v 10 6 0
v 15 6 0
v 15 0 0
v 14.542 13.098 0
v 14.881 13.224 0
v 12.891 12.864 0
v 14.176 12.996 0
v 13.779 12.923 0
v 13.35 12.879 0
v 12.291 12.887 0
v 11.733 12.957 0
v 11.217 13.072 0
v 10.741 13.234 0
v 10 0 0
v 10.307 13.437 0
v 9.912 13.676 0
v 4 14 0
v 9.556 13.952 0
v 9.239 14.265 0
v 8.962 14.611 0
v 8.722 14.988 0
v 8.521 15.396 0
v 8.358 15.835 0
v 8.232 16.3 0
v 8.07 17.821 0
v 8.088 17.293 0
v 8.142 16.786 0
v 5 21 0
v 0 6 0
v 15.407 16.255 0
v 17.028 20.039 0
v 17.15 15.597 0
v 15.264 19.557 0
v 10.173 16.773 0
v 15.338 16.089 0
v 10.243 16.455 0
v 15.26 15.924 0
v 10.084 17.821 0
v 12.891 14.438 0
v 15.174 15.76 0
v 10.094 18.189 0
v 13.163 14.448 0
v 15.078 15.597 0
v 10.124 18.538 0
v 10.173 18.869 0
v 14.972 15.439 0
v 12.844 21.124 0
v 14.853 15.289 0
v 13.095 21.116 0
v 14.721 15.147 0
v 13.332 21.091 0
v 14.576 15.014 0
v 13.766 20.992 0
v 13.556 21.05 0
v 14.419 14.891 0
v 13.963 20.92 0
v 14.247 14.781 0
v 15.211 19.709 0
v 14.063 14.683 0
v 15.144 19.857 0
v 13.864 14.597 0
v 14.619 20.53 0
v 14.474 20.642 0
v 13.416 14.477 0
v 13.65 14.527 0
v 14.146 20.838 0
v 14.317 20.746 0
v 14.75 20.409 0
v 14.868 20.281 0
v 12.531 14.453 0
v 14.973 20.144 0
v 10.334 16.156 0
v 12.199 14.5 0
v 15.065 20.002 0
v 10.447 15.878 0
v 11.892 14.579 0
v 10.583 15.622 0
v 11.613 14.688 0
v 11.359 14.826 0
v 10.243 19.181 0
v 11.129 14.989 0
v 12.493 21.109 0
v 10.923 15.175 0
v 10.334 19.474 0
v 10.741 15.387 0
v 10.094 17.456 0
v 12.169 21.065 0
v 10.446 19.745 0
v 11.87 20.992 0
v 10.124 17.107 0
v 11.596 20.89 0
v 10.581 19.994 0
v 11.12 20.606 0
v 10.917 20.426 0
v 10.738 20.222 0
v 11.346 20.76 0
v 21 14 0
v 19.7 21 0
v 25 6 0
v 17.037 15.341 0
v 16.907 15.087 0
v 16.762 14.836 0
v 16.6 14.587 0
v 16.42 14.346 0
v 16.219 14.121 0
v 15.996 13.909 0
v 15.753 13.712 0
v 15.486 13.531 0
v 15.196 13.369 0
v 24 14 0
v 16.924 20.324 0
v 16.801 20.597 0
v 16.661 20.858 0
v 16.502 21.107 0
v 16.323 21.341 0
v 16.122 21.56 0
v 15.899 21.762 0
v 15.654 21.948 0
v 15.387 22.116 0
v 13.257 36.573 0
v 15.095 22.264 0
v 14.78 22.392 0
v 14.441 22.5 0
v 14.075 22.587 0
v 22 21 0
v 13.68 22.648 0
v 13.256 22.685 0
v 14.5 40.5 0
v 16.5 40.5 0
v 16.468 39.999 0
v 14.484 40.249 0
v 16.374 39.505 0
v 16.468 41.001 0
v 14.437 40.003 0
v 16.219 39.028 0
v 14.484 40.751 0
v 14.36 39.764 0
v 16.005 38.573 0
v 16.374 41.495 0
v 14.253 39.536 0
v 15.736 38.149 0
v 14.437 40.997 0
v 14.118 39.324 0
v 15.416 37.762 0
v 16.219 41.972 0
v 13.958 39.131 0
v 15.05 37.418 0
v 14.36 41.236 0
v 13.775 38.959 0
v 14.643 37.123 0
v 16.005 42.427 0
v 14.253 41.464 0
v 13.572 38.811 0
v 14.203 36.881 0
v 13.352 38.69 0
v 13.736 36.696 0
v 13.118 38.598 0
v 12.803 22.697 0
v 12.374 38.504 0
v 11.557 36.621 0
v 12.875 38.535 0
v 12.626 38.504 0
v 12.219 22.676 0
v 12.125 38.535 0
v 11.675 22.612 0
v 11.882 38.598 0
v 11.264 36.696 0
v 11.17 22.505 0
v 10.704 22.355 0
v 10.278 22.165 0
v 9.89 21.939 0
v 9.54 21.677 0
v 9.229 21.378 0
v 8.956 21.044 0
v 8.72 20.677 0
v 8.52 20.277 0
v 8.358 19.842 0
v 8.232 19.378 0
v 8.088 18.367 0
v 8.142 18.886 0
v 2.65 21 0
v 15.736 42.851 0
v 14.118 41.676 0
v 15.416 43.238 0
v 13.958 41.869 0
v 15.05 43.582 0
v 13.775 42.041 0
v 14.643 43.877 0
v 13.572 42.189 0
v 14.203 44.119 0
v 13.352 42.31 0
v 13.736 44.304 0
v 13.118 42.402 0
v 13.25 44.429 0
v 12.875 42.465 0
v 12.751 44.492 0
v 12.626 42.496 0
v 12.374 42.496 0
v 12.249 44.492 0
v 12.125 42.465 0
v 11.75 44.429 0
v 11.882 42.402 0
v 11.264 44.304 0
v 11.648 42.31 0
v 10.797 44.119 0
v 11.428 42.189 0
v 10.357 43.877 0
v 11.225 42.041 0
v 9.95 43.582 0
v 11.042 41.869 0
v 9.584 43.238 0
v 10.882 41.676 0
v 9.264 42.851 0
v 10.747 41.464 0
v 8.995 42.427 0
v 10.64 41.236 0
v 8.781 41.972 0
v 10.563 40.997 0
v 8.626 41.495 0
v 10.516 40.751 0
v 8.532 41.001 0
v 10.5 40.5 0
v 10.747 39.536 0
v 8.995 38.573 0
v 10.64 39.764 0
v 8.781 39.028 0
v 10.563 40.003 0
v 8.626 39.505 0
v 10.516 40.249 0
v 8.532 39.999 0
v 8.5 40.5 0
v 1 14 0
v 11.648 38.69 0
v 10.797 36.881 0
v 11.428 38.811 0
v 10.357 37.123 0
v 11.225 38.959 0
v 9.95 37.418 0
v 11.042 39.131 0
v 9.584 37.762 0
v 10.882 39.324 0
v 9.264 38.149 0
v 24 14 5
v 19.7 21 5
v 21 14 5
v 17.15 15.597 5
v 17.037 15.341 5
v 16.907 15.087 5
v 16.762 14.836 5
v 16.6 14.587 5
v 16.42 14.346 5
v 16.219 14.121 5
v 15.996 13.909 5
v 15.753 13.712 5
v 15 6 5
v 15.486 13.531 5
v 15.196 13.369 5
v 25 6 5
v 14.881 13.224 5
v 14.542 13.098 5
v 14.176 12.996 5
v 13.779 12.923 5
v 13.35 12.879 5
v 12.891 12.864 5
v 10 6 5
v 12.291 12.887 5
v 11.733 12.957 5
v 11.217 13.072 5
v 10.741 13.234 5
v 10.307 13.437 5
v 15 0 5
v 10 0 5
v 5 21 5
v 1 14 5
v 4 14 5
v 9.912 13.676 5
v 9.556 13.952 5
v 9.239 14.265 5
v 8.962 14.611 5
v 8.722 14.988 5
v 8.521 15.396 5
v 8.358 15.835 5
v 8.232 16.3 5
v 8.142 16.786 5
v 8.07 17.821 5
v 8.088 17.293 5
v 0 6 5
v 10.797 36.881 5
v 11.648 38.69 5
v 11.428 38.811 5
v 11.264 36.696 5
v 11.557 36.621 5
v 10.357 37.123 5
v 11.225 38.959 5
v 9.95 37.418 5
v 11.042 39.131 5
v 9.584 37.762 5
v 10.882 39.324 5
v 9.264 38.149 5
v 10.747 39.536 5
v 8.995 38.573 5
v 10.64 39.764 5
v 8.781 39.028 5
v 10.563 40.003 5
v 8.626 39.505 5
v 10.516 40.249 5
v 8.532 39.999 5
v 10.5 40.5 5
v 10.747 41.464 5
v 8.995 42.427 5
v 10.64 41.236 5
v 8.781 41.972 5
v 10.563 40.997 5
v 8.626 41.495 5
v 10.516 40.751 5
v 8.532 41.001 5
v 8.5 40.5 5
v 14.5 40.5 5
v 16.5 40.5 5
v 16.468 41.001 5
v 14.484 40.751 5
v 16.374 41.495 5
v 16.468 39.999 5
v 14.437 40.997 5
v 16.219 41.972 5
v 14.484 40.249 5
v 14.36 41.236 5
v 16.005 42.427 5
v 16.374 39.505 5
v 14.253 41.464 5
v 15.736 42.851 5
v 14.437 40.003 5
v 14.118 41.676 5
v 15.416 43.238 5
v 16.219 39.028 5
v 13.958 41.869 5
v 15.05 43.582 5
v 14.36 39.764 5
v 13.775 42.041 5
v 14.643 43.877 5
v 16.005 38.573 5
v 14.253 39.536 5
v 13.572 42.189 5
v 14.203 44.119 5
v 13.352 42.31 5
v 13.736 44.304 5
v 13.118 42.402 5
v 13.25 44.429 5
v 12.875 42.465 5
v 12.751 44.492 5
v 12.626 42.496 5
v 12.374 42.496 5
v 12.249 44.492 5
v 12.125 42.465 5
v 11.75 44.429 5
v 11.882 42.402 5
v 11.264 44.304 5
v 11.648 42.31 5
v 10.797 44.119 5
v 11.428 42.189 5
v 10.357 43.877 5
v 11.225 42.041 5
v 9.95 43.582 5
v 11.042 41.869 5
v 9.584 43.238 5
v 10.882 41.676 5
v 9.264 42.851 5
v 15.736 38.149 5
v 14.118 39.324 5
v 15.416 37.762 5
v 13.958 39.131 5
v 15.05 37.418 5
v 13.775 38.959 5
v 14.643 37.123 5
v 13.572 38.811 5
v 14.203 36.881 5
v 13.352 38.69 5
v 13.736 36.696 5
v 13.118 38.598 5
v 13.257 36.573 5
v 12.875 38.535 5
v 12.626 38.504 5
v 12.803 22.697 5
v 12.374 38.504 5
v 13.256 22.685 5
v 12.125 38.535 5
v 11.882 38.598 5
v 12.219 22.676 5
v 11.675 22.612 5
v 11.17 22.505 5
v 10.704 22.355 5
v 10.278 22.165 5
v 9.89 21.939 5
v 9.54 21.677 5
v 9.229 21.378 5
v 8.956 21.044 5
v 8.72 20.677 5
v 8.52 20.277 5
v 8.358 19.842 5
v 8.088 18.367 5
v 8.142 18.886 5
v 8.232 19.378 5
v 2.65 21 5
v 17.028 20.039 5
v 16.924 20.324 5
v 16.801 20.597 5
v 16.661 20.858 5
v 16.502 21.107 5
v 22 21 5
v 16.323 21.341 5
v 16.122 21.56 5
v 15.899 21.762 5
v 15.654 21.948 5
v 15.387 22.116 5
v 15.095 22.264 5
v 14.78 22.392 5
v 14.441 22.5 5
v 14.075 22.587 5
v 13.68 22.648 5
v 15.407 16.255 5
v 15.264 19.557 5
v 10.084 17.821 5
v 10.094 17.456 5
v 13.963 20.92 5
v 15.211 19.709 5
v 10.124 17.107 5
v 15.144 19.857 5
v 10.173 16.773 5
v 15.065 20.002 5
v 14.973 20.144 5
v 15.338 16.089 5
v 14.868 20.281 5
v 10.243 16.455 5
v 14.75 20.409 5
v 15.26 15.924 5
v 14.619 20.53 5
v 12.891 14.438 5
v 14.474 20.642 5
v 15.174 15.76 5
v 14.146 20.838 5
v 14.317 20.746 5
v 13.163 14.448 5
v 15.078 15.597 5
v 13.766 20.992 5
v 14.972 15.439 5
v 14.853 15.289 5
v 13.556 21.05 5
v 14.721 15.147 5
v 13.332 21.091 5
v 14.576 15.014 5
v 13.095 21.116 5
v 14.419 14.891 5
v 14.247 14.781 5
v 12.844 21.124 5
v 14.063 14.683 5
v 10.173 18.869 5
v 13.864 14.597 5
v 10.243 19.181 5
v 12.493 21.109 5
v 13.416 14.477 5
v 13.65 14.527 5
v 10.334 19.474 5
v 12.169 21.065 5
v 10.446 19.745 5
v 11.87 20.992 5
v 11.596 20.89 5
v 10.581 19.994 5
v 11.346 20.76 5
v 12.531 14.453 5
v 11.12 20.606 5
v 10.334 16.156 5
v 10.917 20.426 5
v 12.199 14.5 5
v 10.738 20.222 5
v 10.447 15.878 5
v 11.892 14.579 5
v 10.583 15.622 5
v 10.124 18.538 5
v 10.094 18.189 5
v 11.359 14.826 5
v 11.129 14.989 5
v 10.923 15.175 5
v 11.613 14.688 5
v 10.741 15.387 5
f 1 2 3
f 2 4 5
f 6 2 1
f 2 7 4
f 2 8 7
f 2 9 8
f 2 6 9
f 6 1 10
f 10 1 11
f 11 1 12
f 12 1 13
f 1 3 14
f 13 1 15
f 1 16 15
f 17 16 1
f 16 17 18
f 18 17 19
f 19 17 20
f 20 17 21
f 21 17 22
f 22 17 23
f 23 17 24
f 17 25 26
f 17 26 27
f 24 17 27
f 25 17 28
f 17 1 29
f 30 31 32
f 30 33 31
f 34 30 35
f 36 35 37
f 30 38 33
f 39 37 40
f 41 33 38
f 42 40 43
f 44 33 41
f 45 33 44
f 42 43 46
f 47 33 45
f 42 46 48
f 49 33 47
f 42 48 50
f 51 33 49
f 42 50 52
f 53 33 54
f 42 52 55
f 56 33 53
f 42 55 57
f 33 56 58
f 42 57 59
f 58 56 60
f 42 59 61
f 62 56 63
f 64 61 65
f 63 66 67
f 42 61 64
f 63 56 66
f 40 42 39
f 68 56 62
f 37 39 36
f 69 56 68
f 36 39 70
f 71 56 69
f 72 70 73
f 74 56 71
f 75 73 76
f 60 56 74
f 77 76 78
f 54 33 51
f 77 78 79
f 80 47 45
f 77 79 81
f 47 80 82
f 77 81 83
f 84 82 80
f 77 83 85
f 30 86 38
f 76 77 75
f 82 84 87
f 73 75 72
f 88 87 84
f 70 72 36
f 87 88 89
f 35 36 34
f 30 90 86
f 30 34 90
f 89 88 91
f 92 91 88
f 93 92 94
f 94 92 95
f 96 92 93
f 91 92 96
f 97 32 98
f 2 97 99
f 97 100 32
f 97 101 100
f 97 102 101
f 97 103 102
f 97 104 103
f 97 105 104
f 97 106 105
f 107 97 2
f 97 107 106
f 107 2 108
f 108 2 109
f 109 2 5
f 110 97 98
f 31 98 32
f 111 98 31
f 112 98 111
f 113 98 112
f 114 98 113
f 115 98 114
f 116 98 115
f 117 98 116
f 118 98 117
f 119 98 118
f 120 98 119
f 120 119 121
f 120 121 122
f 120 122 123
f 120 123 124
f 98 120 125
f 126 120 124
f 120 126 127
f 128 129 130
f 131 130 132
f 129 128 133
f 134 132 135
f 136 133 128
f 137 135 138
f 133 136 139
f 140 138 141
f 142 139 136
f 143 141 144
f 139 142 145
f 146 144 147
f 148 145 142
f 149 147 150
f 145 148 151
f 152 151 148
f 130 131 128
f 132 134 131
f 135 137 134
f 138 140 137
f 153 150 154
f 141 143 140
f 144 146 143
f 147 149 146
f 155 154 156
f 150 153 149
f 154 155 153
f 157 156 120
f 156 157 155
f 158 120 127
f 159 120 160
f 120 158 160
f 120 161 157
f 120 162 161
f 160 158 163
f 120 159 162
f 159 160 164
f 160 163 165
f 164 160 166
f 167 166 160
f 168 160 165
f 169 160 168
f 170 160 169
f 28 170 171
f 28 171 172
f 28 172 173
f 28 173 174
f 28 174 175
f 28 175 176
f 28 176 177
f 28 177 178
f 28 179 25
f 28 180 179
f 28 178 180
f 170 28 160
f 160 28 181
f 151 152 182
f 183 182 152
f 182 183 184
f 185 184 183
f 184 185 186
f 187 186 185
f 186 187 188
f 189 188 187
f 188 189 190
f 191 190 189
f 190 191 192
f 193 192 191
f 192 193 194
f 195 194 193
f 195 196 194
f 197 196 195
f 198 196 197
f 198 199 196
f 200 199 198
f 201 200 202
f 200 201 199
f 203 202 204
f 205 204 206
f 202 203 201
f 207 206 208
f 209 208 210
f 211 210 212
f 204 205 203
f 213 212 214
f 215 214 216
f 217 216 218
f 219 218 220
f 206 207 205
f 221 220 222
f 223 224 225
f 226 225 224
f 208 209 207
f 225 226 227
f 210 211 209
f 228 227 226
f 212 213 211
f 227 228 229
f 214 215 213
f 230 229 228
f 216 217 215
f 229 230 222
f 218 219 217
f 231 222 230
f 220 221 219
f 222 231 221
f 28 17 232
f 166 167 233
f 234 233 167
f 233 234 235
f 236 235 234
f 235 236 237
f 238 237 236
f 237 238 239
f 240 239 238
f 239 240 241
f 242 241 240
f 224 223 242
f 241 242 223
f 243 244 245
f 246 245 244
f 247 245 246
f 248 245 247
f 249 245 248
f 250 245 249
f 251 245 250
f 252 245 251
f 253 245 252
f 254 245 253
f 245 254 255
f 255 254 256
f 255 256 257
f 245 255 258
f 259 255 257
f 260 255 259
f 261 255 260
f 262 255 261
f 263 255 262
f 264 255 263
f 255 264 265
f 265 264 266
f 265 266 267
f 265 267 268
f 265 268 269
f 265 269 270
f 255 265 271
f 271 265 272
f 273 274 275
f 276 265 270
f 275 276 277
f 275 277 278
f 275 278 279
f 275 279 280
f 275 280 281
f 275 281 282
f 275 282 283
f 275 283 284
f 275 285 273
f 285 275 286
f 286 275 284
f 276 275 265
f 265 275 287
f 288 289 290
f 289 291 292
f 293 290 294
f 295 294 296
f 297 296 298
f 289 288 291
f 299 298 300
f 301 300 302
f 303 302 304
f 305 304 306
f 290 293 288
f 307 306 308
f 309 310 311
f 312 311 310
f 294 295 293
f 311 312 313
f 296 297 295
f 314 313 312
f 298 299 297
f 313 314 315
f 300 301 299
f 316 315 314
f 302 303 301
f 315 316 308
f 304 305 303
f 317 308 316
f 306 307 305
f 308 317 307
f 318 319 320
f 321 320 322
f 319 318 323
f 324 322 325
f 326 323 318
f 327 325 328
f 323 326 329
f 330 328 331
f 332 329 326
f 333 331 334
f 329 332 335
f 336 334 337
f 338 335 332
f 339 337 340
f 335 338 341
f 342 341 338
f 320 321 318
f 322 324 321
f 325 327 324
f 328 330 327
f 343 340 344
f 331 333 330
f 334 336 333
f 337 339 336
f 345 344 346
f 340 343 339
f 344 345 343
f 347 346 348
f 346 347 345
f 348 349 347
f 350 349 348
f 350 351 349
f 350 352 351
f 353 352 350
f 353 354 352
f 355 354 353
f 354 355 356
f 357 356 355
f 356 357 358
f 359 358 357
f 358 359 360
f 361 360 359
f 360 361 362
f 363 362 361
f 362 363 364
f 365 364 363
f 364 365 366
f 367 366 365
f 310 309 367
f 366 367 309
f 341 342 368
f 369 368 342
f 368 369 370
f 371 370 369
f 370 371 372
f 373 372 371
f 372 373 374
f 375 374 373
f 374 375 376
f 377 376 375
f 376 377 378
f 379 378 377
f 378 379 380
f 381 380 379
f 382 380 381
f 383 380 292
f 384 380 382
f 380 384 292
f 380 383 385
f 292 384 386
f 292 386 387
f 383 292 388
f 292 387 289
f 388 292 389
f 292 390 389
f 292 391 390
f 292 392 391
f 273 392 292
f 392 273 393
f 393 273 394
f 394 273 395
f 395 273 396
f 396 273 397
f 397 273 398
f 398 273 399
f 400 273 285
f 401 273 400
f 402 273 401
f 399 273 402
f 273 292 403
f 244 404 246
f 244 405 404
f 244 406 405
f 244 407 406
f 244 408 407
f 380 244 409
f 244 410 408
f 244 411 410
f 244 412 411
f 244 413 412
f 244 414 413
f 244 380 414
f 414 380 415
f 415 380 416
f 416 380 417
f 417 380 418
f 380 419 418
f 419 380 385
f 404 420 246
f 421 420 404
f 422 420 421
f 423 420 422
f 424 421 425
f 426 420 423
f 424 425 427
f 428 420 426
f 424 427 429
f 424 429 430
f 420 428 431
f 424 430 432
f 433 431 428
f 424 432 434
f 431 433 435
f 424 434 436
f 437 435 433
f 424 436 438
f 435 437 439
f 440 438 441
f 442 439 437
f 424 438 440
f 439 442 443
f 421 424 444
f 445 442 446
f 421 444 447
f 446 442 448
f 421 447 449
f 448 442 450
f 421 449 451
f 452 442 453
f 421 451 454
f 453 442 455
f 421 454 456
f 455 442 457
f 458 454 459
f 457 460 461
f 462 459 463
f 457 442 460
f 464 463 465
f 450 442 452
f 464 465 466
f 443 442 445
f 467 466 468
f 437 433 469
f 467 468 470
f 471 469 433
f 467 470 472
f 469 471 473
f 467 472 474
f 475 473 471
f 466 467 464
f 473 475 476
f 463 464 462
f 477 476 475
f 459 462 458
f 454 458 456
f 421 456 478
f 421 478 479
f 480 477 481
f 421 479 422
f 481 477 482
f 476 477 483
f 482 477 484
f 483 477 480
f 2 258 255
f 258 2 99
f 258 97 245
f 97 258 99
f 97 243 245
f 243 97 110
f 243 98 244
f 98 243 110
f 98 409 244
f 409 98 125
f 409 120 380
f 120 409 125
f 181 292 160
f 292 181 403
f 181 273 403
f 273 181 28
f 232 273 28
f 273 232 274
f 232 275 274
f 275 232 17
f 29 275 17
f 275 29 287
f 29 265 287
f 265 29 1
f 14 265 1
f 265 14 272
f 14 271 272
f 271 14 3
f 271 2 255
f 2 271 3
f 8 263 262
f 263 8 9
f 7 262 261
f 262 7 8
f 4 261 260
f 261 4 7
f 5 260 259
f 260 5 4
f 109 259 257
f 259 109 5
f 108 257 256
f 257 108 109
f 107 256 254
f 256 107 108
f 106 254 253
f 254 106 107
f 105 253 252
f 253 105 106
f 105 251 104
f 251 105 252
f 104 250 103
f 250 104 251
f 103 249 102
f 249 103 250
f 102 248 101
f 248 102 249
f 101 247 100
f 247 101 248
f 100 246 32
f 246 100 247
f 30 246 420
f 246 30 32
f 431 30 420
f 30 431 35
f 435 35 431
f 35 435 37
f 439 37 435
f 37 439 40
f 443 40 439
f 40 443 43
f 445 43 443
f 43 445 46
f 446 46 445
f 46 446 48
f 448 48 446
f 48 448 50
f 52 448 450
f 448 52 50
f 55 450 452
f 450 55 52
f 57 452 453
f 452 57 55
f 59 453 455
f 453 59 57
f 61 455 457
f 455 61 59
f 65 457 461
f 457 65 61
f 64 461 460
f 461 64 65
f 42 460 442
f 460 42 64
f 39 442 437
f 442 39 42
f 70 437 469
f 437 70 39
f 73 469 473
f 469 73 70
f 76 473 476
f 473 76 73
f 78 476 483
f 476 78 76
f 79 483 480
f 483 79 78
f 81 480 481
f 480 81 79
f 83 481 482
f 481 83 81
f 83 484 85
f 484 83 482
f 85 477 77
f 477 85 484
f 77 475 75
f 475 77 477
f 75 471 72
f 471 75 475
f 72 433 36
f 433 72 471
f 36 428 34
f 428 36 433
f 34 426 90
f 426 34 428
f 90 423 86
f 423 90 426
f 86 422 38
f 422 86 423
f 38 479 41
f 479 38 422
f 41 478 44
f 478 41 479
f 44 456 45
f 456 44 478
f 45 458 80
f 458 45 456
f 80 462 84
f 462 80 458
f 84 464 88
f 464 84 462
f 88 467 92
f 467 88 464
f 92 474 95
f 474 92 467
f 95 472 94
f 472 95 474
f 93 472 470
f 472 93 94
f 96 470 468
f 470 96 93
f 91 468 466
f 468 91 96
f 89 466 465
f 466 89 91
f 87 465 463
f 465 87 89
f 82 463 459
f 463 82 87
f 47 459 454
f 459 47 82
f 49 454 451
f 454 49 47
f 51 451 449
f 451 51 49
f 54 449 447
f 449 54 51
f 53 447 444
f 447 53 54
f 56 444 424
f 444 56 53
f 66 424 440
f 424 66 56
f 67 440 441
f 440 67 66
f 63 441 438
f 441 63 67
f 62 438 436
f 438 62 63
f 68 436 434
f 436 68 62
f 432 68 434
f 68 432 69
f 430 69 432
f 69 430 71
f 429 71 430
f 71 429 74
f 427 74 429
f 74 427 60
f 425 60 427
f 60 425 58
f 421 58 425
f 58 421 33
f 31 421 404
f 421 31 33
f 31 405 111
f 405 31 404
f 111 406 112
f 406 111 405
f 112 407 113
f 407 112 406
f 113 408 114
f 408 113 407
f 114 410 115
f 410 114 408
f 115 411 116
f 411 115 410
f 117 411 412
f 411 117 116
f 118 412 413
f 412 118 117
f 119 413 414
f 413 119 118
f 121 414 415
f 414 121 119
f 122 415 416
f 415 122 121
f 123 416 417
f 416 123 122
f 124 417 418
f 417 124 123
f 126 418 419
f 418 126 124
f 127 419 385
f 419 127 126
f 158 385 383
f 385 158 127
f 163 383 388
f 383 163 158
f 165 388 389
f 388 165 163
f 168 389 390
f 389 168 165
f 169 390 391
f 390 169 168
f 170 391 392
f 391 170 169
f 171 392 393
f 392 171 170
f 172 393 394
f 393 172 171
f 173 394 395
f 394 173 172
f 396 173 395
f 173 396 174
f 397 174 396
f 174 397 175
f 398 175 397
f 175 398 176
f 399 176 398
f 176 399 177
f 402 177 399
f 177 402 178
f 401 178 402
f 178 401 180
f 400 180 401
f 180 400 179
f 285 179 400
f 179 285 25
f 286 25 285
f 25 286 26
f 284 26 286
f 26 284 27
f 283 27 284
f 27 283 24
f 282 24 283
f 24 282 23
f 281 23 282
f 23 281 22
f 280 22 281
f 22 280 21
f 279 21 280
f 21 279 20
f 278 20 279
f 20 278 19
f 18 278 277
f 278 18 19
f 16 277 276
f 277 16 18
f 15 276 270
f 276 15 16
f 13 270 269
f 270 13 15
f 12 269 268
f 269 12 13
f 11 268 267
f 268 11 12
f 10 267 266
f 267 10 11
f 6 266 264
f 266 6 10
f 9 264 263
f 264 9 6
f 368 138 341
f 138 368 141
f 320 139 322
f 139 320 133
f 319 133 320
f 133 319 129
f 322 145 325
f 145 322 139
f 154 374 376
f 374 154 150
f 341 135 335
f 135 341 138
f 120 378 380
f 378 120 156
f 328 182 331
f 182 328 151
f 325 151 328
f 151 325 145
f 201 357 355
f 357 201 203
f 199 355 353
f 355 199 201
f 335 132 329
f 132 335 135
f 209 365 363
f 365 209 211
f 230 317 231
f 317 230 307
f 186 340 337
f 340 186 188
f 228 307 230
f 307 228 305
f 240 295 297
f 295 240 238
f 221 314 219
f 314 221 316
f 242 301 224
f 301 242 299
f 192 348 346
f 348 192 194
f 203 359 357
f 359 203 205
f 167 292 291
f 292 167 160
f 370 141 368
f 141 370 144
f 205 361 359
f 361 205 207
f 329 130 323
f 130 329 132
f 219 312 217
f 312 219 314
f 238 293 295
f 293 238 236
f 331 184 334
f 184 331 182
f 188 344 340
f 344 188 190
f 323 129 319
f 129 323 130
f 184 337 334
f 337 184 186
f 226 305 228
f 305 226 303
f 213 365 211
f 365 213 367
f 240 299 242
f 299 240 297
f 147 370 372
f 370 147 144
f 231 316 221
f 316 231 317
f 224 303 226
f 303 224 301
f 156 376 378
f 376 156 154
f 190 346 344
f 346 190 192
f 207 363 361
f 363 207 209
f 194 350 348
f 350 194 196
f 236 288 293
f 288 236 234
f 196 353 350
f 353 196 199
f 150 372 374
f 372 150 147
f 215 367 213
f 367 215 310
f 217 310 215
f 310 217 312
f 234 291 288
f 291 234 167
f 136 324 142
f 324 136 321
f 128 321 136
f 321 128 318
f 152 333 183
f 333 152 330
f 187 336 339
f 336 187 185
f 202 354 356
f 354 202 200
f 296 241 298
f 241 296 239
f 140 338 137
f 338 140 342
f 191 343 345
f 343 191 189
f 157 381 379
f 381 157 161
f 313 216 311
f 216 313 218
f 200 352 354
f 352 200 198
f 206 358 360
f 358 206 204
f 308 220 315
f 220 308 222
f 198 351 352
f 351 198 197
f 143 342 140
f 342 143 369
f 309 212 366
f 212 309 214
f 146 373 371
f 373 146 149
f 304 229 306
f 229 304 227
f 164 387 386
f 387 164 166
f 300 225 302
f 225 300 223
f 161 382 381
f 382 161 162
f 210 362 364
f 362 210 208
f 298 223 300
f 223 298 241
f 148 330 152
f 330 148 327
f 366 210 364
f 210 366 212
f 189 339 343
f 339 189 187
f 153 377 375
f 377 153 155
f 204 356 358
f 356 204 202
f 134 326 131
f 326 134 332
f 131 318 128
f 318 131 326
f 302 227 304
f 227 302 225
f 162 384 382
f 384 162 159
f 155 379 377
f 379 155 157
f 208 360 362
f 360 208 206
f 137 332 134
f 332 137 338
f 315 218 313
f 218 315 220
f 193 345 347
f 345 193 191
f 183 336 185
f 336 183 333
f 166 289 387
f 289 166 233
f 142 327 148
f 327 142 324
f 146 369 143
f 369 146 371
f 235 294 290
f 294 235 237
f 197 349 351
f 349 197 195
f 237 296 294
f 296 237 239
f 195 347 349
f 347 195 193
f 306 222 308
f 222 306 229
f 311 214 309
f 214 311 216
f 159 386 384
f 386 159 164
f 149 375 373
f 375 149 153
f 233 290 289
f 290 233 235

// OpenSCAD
//CUSTOMIZER VARIABLES
character = "C";	//	[A,B,C,D,E,F,G,H,I,J,K,L,M,N,O,P,Q,R,S,T,U,V,W,X,Y,Z]
char_pos = 7.5; // Character Position [6:9]
//CUSTOMIZER VARIABLES END

difference(){

linear_extrude(height = 5)
polygon(points = [ [10, 0], [10, 6],[0, 6],[4, 14],[1, 14],[5, 21],[2.65, 21],[12.4, 38.1],[12.4, 38.1],[22, 21],[19.7, 21],[24, 14],[21, 14],[25, 6],[15, 6],[15, 0]]);
    
    
    



translate([char_pos,13,0])    
linear_extrude(height = 5)
   text(character,font="Arial:style=Bold");
}
translate([12.5,40.5,0])
difference(){
cylinder(r=4,h=5,$fn=50);
cylinder(r=2,h=5,$fn=50);
}

